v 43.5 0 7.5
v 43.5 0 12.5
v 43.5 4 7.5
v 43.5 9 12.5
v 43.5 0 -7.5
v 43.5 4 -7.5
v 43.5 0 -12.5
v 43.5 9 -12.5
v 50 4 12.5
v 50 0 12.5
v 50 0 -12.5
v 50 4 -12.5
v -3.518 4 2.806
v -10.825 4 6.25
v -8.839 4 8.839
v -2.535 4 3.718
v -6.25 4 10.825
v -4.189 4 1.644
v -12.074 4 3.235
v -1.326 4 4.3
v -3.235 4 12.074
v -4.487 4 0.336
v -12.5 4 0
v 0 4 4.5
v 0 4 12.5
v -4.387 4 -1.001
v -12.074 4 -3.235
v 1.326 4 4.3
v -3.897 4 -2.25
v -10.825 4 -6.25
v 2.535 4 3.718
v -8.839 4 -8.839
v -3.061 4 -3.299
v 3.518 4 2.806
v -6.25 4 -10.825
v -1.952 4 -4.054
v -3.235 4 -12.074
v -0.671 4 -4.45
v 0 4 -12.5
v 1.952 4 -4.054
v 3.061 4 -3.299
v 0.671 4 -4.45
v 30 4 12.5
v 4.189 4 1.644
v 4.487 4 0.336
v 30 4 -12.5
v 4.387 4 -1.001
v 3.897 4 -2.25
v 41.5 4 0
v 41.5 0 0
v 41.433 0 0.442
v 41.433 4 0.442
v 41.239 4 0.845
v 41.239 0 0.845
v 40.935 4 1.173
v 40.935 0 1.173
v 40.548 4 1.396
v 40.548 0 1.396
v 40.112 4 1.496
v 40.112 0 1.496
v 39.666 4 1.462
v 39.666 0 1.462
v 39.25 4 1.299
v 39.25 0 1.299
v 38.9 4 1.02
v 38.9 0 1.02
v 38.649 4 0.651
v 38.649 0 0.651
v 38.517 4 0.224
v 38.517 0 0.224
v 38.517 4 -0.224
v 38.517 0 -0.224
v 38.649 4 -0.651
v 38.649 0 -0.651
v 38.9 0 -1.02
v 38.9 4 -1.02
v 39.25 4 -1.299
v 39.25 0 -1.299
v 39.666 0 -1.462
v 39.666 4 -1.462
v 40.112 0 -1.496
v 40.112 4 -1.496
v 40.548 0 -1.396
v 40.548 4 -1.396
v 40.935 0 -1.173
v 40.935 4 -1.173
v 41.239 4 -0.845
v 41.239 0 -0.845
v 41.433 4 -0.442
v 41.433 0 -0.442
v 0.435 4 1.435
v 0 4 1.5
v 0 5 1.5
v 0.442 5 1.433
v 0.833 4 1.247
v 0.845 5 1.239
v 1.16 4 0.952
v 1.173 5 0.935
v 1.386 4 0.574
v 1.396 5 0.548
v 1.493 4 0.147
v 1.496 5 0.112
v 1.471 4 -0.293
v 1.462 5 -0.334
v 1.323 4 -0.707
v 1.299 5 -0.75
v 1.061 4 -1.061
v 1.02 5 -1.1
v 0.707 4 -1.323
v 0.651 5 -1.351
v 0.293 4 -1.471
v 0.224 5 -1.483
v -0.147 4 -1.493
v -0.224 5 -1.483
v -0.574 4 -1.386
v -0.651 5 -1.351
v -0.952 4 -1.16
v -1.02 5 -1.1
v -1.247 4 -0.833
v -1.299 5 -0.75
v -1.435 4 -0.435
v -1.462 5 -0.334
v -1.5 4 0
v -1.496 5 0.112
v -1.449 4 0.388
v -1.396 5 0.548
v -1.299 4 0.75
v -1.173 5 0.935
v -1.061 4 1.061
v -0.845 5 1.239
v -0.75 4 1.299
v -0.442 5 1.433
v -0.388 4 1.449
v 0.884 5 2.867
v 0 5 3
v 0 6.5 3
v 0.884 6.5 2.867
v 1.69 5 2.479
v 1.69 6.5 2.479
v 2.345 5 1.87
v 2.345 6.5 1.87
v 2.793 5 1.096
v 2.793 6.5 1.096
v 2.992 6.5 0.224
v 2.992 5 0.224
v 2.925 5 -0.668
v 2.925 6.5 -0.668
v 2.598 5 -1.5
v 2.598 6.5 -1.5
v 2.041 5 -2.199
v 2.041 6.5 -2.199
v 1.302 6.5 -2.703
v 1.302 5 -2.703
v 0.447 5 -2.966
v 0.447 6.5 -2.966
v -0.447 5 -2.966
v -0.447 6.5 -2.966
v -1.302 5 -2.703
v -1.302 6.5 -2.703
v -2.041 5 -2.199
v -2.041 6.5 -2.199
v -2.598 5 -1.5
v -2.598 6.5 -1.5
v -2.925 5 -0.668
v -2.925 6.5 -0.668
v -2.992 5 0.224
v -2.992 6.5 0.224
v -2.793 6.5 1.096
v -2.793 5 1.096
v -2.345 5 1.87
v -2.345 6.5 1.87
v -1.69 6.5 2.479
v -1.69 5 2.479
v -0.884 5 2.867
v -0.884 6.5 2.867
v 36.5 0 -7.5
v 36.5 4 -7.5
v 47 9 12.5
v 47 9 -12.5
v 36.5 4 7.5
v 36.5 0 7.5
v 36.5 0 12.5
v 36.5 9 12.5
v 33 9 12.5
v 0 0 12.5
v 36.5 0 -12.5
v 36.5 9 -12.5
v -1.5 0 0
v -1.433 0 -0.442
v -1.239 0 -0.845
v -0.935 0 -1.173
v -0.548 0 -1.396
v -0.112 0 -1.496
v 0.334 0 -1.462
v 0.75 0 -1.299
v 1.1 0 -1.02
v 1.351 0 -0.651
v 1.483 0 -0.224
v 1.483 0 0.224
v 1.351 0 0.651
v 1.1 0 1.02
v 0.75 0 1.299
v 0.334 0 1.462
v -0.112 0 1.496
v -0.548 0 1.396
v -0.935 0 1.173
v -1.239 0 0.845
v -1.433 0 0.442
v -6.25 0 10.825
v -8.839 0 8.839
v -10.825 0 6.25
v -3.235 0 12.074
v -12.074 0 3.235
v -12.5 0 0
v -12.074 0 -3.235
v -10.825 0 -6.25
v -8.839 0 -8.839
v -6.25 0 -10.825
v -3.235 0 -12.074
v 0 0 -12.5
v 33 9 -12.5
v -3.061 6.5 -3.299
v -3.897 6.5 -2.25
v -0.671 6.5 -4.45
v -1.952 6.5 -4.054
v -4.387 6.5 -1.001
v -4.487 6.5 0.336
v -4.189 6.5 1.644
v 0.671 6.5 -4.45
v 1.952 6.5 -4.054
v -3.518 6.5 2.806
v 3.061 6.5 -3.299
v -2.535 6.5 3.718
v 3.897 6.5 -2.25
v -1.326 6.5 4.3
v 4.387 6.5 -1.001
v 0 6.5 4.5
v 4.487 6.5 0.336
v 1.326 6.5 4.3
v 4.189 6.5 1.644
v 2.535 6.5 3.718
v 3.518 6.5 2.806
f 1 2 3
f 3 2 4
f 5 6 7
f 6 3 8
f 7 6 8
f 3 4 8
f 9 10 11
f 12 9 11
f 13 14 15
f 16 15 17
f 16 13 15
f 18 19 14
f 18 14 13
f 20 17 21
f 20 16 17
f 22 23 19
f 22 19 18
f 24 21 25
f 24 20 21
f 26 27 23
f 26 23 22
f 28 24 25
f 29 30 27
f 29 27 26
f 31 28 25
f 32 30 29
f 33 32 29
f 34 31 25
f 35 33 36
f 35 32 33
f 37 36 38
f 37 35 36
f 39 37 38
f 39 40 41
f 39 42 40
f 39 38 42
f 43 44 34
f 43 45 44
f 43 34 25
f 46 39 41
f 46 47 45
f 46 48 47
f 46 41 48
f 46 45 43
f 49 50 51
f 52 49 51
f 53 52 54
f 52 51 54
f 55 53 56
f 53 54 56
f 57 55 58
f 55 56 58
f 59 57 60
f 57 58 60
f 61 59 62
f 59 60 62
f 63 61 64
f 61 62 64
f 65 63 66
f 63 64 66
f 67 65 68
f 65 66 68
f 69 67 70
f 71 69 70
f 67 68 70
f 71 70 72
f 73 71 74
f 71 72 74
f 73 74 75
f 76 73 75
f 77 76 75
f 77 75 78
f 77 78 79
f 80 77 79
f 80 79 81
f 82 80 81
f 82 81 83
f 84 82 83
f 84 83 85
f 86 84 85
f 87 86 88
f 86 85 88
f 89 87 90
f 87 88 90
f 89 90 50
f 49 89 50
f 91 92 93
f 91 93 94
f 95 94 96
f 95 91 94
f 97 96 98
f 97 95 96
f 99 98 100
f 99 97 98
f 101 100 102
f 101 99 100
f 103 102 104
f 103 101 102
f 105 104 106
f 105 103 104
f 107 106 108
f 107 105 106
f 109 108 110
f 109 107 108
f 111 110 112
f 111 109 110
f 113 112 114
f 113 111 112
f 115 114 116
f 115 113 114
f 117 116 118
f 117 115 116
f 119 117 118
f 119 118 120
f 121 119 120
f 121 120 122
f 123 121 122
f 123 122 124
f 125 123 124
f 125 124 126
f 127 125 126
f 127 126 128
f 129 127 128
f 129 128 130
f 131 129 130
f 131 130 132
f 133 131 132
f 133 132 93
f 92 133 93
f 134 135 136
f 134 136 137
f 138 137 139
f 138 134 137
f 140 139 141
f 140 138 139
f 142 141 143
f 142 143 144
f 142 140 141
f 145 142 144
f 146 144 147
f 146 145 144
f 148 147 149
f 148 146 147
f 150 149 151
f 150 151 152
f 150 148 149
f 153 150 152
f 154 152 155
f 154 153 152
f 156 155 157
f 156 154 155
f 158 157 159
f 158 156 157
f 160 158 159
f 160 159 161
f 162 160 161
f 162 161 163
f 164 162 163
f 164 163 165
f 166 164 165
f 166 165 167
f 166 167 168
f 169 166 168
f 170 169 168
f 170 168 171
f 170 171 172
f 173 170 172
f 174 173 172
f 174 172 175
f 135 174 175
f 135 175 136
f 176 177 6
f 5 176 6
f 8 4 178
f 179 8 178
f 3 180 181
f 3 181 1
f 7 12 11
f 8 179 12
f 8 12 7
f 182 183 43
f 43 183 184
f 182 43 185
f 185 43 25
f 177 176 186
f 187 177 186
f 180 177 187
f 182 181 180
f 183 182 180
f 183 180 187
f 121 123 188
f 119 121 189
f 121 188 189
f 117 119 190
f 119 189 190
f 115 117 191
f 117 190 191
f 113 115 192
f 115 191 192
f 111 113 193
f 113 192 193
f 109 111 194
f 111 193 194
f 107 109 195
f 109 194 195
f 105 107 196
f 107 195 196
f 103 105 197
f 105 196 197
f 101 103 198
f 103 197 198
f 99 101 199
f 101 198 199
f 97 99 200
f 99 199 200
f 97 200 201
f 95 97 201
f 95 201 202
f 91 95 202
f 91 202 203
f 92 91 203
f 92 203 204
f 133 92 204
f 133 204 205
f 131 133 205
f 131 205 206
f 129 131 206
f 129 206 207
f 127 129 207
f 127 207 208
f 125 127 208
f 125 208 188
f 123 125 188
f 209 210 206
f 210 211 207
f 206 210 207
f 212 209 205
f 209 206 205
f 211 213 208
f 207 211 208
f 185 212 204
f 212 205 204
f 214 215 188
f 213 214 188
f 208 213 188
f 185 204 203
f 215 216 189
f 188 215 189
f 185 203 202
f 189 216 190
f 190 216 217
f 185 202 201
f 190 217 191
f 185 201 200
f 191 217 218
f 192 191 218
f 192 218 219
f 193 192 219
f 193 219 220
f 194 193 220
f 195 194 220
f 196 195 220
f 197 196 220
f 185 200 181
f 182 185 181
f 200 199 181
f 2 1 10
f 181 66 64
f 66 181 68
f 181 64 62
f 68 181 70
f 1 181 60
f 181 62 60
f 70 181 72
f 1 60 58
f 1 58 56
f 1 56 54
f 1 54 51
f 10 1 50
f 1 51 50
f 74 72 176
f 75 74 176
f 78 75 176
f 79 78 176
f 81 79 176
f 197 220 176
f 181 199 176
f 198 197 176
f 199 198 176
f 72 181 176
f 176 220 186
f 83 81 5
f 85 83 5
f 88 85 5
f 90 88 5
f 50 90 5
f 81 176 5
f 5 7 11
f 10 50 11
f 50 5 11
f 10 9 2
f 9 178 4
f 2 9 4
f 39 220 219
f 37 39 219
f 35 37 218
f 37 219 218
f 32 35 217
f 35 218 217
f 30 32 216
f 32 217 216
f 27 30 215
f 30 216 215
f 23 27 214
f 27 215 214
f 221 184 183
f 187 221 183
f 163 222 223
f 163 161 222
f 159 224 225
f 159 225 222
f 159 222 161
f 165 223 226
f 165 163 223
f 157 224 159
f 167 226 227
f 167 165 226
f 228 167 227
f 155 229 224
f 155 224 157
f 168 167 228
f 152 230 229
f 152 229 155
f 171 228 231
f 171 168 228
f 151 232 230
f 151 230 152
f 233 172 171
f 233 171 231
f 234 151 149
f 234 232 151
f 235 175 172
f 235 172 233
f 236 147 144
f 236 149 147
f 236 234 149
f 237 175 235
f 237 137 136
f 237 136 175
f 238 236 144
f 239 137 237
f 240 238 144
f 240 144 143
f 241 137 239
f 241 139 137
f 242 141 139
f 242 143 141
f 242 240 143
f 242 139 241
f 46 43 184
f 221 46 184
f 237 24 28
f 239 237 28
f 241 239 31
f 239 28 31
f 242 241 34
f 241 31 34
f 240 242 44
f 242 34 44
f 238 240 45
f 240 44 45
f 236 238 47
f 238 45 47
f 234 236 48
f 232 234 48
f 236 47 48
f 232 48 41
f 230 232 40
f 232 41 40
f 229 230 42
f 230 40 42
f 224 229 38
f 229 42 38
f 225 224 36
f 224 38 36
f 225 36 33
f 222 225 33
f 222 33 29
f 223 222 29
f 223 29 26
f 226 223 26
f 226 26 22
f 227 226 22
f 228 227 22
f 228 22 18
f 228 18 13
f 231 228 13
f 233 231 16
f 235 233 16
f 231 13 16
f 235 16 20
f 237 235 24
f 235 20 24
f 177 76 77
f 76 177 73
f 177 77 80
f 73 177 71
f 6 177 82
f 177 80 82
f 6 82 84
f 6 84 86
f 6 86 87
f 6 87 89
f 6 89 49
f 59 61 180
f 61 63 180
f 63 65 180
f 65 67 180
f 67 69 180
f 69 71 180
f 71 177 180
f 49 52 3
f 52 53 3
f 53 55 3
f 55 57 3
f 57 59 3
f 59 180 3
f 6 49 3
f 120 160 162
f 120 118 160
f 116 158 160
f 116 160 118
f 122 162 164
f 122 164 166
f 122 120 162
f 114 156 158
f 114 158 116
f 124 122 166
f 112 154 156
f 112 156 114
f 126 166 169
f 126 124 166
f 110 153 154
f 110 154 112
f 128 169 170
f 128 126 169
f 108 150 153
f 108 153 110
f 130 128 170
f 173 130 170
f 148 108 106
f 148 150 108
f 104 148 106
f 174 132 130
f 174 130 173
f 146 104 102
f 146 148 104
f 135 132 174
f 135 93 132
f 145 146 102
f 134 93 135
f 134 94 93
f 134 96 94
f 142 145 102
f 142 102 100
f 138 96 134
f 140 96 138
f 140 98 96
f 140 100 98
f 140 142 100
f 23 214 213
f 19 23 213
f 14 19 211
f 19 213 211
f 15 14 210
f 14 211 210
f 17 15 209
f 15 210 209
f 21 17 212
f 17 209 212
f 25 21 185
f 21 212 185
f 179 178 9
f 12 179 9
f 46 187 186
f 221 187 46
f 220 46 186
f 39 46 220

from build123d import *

# Parameters (mm, degrees)
EXTRUDE_1_DEPTH     = 4
SKETCH_2_R          = 4.5
SKETCH_2_R_2        = 3
EXTRUDE_2_DEPTH     = 2.5
EXTRUDE_3_DEPTH     = 25
SKETCH_4_W          = 7
SKETCH_4_H          = 5
CUT_EXTRUDE_1_DEPTH = 57.621550668
SKETCH_5_W          = 7
SKETCH_5_H          = 5
CUT_EXTRUDE_2_DEPTH = 52.780787943
SKETCH_6_R          = 3
SKETCH_6_R_2        = 1.5
EXTRUDE_4_DEPTH     = 1


with BuildPart() as part:
    # 草图1 → 凸台-拉伸1 (new body)
    with BuildSketch(Plane(origin=(0, 0, 0), x_dir=(1, 0, 0), z_dir=(0, 1, 0))):
        with BuildLine():
            ThreePointArc((12.5, 0), (8.838834765, 8.838834765), (0, 12.5))
            ThreePointArc((0, 12.5), (-8.838834765, 8.838834765), (-12.5, 0))
            Line((-12.5, 0), (-1.5, 0))
            ThreePointArc((-1.5, 0), (0, 1.5), (1.5, 0))
            Line((1.5, 0), (12.5, 0))
        make_face()
        with BuildLine():
            ThreePointArc((0, -12.5), (8.838834765, -8.838834765), (12.5, 0))
            Line((12.5, 0), (1.5, 0))
            ThreePointArc((1.5, 0), (0, -1.5), (-1.5, 0))
            Line((-1.5, 0), (-12.5, 0))
            ThreePointArc((-12.5, 0), (-8.838834765, -8.838834765), (0, -12.5))
        make_face()
        with BuildLine():
            Line((50, 12.5), (0, 12.5))
            ThreePointArc((0, 12.5), (8.838834765, 8.838834765), (12.5, 0))
            Line((12.5, 0), (38.5, 0))
            ThreePointArc((38.5, 0), (40, 1.5), (41.5, 0))
            Line((41.5, 0), (50, 0))
            Line((50, 0), (50, 12.5))
        make_face()
        with BuildLine():
            Line((38.5, 0), (12.5, 0))
            ThreePointArc((12.5, 0), (8.838834765, -8.838834765), (0, -12.5))
            Line((0, -12.5), (50, -12.5))
            Line((50, -12.5), (50, 0))
            Line((50, 0), (41.5, 0))
            ThreePointArc((41.5, 0), (40, -1.5), (38.5, 0))
        make_face()
    extrude(amount=EXTRUDE_1_DEPTH)

    # 草图2 → 凸台-拉伸2 (add)
    with BuildSketch(Plane(origin=(0, 4, 0), x_dir=(1, 0, 0), z_dir=(0, 1, 0))):
        with Locations(Location((0, 0, 0), (0, 0, 270))):
            Circle(SKETCH_2_R)
        with Locations(Location((0, 0, 0), (0, 0, 270))):
            Circle(SKETCH_2_R_2, mode=Mode.SUBTRACT)
    extrude(amount=EXTRUDE_2_DEPTH)

    # 草图3 → 凸台-拉伸3 (add)
    with BuildSketch(Plane.XY.offset(12.5)):
        Polygon((33, 9), (47, 9), (50, 4), (30, 4), align=None)
    extrude(amount=-EXTRUDE_3_DEPTH)

    # 草图4 → 切除-拉伸1 (cut, through all)
    with BuildSketch(Plane.XY.offset(12.5)):
        with Locations((40, 6.5)):
            Rectangle(SKETCH_4_W, SKETCH_4_H)
    extrude(amount=-CUT_EXTRUDE_1_DEPTH, mode=Mode.SUBTRACT)

    # 草图5 → 切除-拉伸2 (cut, through all)
    with BuildSketch(Plane(origin=(0, 4, 0), x_dir=(1, 0, 0), z_dir=(0, 1, 0))):
        with Locations((40, -10)):
            Rectangle(SKETCH_5_W, SKETCH_5_H)
        with Locations((40, 10)):
            Rectangle(SKETCH_5_W, SKETCH_5_H)
    extrude(amount=-CUT_EXTRUDE_2_DEPTH, mode=Mode.SUBTRACT)

    # 草图6 → 凸台-拉伸4 (add)
    with BuildSketch(Plane(origin=(0, 4, 0), x_dir=(1, 0, 0), z_dir=(0, 1, 0))):
        with Locations(Location((0, 0, 0), (0, 0, 270))):
            Circle(SKETCH_6_R)
        with Locations(Location((0, 0, 0), (0, 0, 270))):
            Circle(SKETCH_6_R_2, mode=Mode.SUBTRACT)
    extrude(amount=EXTRUDE_4_DEPTH)


solid = part.part
